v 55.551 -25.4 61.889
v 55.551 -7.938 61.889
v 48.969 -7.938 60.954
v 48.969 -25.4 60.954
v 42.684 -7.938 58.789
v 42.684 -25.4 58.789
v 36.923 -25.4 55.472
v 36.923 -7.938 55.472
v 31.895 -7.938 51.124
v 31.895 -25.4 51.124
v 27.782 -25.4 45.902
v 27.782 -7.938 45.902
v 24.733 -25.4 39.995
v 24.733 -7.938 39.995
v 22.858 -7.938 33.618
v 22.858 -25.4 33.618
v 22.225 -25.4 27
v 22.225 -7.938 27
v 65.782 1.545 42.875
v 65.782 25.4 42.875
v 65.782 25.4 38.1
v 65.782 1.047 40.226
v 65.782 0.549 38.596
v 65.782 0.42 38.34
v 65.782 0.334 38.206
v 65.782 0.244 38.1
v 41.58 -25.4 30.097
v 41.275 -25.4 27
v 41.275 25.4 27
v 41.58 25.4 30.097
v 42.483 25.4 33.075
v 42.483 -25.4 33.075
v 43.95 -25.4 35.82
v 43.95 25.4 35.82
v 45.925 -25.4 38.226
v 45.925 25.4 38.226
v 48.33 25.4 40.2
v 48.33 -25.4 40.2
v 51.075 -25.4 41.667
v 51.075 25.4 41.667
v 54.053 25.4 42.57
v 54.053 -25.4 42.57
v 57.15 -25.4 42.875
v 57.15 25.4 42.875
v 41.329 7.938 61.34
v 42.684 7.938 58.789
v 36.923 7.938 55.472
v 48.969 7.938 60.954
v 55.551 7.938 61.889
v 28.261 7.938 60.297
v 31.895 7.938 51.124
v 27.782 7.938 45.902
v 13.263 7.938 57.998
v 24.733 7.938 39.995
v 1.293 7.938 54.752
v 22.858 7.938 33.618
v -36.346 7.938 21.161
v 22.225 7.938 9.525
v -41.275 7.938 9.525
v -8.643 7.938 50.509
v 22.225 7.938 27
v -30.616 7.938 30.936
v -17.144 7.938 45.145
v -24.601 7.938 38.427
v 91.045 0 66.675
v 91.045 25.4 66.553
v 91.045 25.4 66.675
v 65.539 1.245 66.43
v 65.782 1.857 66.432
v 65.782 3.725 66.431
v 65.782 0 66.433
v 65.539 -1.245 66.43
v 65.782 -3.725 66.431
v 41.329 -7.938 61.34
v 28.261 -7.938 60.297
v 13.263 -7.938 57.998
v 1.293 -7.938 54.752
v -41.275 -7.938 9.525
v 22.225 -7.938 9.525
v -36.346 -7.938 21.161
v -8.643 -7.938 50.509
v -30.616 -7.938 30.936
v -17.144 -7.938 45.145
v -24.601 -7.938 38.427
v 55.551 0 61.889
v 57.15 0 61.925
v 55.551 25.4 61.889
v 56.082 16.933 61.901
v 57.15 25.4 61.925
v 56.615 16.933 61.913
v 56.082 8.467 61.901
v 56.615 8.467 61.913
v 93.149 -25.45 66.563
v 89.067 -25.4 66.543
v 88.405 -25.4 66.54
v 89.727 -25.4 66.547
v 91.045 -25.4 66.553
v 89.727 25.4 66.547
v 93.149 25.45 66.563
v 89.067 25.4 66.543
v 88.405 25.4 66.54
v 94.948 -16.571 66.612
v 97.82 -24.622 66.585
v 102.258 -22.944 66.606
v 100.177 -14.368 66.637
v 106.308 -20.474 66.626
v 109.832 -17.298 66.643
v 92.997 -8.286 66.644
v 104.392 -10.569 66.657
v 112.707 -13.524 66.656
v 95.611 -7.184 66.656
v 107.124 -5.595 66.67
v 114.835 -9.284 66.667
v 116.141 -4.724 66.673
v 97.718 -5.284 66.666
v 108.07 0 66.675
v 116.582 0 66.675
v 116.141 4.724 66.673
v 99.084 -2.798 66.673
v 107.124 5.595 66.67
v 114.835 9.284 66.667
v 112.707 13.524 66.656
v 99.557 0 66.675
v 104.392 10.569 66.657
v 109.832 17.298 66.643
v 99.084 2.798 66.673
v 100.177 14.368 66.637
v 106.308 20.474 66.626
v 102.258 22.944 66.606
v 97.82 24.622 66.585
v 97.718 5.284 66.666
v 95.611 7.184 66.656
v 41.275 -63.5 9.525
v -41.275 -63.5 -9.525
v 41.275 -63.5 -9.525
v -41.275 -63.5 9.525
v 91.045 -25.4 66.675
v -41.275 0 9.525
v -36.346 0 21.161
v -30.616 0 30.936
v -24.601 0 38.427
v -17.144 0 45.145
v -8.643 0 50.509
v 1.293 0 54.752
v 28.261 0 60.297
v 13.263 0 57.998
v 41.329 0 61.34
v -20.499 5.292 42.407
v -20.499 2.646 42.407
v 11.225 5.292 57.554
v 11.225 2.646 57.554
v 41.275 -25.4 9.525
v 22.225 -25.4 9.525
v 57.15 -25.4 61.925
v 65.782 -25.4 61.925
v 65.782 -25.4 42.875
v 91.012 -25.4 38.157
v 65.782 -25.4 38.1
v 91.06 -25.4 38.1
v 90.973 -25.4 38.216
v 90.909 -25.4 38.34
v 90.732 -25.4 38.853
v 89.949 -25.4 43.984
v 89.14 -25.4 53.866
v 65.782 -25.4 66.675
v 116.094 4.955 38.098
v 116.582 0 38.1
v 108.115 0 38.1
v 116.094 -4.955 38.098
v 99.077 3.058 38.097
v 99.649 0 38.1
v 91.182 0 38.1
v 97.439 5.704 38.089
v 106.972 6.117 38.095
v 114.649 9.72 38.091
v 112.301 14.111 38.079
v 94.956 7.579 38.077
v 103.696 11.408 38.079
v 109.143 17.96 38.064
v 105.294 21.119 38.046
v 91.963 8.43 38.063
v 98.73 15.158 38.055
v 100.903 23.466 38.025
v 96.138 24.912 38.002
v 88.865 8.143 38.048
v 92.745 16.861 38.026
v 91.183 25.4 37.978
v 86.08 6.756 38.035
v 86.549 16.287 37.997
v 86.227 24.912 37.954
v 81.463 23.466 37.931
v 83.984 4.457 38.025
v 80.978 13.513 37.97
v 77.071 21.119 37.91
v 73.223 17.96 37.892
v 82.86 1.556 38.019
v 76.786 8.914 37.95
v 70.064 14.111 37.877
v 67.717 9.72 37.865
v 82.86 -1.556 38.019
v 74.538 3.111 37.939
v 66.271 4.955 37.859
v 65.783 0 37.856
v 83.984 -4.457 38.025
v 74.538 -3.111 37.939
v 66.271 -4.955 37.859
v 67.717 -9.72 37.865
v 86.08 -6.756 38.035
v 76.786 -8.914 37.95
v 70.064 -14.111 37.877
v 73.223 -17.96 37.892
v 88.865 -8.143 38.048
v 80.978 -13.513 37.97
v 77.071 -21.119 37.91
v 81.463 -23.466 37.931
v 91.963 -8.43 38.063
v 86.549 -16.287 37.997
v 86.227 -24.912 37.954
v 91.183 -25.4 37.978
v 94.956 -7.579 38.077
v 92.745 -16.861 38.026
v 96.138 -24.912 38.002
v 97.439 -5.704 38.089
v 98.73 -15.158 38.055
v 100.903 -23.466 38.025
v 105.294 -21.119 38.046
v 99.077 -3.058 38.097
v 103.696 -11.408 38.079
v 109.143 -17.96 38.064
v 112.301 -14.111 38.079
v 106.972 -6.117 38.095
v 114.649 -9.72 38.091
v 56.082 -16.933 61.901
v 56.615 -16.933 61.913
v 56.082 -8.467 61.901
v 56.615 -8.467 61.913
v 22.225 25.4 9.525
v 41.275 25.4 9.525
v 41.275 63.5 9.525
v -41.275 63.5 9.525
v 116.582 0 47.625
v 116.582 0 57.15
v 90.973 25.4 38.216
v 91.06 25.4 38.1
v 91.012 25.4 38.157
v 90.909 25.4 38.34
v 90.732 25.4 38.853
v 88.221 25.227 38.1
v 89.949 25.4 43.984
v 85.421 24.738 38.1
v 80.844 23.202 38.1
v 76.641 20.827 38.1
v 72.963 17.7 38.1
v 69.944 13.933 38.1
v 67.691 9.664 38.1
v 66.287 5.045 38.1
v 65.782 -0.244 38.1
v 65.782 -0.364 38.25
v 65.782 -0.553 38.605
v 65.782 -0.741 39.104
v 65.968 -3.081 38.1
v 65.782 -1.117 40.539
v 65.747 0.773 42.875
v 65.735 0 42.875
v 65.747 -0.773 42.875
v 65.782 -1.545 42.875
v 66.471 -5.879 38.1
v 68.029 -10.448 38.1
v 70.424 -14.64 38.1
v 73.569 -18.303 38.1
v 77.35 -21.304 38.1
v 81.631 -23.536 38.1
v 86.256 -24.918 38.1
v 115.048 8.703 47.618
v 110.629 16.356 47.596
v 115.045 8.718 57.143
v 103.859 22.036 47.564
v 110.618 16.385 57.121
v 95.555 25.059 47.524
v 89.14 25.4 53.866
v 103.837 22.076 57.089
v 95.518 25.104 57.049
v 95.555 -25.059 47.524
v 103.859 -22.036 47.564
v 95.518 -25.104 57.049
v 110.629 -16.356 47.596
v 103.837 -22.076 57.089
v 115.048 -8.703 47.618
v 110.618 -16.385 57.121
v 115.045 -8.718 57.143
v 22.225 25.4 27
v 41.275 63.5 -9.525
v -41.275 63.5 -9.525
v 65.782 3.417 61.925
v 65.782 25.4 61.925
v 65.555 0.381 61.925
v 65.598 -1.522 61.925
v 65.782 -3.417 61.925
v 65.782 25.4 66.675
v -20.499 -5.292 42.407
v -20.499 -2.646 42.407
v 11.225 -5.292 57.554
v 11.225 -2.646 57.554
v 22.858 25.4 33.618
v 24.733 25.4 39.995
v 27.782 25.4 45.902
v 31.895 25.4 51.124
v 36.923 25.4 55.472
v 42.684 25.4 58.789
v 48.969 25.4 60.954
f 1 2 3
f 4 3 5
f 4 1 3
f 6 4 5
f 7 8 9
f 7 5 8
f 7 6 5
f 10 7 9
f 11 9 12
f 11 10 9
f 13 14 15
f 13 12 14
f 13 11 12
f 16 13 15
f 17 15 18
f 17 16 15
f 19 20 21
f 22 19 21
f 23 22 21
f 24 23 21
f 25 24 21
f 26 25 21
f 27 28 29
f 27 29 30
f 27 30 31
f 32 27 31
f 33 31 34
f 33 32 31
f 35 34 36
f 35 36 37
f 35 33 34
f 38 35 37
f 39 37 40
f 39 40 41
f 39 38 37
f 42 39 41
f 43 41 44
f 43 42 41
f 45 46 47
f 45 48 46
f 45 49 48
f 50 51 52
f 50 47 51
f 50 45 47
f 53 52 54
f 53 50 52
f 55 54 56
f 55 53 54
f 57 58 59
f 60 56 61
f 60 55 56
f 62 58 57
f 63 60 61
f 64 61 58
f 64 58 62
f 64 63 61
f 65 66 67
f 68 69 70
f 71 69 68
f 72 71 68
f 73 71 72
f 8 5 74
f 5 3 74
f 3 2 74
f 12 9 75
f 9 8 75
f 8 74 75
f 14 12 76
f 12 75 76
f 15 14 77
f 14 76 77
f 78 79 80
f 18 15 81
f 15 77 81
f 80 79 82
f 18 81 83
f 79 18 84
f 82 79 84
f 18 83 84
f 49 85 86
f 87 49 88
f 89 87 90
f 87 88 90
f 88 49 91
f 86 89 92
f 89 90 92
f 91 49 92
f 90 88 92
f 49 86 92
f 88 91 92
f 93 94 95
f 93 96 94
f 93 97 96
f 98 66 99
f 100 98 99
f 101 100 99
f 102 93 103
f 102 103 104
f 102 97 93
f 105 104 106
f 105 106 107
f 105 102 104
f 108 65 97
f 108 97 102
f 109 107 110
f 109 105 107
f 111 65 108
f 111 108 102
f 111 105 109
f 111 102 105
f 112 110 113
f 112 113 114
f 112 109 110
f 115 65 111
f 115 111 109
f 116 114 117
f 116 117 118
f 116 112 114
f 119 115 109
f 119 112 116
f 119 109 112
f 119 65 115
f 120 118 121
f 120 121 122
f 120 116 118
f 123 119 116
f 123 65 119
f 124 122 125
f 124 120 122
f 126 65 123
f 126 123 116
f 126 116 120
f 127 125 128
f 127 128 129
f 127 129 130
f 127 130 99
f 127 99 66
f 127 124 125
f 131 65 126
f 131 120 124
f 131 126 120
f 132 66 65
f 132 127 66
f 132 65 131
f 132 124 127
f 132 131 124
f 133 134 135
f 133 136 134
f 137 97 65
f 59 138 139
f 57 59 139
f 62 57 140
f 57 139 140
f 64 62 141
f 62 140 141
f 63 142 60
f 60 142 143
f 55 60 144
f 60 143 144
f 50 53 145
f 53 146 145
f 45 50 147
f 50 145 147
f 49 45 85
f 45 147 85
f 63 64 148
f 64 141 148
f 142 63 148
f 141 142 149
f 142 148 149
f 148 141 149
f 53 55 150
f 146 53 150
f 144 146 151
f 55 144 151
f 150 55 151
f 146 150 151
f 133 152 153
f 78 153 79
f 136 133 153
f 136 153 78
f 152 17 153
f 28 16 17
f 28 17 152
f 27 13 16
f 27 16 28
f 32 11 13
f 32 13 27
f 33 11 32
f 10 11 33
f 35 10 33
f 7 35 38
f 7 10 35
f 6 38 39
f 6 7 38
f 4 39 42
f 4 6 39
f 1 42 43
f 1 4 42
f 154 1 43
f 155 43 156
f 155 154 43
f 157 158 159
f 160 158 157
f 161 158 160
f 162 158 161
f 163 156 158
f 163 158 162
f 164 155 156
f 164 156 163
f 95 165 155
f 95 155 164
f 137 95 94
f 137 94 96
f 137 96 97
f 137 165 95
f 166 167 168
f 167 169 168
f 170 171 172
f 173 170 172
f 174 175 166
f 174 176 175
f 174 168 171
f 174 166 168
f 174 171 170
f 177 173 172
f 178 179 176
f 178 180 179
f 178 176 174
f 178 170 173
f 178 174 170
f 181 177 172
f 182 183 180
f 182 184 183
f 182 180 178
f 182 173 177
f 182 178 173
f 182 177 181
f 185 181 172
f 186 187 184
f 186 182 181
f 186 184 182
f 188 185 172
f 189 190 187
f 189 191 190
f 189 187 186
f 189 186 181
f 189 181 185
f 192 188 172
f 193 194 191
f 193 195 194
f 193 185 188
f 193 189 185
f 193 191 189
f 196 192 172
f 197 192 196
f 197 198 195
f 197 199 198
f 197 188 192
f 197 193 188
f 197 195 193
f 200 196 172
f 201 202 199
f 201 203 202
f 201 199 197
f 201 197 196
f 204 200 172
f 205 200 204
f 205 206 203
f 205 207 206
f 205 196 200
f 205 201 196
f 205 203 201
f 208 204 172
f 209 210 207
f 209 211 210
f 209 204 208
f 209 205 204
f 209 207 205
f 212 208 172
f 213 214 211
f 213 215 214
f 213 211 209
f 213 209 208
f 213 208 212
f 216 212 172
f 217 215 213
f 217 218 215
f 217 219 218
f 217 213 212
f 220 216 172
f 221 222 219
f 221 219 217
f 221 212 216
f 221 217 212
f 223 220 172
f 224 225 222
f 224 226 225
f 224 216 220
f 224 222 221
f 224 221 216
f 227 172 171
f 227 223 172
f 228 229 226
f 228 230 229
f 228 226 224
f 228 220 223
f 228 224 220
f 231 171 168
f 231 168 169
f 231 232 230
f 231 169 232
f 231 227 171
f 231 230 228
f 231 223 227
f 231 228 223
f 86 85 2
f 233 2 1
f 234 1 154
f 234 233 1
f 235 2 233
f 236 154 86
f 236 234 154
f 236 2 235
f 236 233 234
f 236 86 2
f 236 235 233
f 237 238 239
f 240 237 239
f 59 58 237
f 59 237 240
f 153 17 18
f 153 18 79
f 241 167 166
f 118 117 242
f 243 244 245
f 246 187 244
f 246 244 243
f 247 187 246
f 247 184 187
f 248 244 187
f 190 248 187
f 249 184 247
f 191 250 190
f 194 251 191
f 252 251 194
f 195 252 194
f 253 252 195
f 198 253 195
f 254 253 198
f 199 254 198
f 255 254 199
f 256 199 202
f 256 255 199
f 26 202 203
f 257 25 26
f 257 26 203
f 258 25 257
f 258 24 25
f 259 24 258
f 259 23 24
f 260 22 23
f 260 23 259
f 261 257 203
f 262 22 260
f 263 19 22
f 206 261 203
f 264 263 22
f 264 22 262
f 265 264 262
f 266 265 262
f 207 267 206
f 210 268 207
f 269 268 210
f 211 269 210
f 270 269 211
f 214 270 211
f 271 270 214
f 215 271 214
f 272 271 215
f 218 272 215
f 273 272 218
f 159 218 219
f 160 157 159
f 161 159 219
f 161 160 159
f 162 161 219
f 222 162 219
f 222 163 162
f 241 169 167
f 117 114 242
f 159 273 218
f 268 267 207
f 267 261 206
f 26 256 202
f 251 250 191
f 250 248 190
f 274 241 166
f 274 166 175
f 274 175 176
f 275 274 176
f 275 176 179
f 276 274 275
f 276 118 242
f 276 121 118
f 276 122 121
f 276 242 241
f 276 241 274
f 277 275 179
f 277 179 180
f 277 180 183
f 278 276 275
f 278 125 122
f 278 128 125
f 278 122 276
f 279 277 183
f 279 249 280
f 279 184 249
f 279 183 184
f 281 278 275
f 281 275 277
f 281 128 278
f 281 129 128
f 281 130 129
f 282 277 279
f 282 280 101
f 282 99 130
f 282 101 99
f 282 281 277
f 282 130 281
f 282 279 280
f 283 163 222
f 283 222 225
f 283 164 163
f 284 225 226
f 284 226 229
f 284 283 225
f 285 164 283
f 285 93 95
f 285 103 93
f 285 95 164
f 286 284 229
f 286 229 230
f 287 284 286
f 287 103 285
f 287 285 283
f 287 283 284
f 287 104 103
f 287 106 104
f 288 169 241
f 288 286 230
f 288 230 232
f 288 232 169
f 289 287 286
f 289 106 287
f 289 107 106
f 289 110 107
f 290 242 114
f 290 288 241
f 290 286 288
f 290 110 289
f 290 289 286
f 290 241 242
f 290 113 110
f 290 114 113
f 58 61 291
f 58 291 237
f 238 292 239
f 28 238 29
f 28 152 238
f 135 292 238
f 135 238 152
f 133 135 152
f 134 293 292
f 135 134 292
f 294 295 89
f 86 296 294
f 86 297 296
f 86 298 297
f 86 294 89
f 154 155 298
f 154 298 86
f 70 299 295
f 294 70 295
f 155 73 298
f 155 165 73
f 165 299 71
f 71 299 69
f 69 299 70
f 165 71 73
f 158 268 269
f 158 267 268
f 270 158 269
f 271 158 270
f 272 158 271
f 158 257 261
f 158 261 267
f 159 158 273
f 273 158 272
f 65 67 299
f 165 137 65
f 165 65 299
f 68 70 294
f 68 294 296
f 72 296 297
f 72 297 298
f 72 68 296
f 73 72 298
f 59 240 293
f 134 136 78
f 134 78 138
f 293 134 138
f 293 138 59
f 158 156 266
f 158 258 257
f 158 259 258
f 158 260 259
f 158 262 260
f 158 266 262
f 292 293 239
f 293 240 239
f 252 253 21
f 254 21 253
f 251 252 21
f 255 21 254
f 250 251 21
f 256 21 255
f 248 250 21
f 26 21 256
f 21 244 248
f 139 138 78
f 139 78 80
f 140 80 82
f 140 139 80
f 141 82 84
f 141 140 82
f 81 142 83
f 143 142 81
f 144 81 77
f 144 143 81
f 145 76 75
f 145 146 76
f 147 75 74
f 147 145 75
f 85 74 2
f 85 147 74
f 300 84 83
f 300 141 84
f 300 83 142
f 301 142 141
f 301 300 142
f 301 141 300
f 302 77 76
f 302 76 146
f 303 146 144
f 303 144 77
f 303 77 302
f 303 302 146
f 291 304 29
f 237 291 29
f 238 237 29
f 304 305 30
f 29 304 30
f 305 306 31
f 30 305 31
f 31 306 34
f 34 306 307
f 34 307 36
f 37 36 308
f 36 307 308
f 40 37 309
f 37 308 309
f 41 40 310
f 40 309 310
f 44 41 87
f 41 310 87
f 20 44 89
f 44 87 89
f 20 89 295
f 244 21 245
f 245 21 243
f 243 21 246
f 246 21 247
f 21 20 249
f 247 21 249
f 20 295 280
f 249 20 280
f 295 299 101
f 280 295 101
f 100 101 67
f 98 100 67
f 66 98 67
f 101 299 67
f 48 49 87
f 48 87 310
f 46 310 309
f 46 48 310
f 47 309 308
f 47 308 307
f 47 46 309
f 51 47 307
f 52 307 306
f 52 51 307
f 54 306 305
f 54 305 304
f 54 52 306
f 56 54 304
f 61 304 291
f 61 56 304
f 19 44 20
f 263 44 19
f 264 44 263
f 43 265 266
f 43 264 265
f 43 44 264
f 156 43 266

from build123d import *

# Parameters (mm, degrees)
F1_DEPTH = 63.5
F2_DEPTH = 25.4
F3_DEPTH = 7.9375
F4_DEPTH = 25.4


with BuildPart() as f1:
    # F0 (on Front) → F1 (new body, symmetric)
    with BuildSketch(Plane.XZ):
        Polygon((-41.275, -9.525), (41.275, -9.525), (41.275, 9.525), (22.225, 9.525), (-41.275, 9.525), align=None)
    extrude(amount=F1_DEPTH, both=True)

    # F0 (on Front) → F2 (join, symmetric)
    with BuildSketch(Plane.XZ):
        with BuildLine():
            Line((22.225, 9.525), (41.275, 9.525))
            Line((41.275, 9.525), (41.275, 27.0002))
            ThreePointArc((41.275, 27.0002), (45.9246798487, 38.2255201513), (57.15, 42.8752))
            Line((57.15, 42.8752), (65.7820404529, 42.8752))
            Line((65.7820404529, 42.8752), (65.7820404529, 61.9252))
            Line((65.7820404529, 61.9252), (57.15, 61.9252))
            add(Edge.make_bspline(
                [(55.550874855, 61.8885708959), (56.0816141812, 61.9013962884), (56.6146531302, 61.9135944066), (57.15, 61.9252)],
                knots=[110.3600423444, 110.3600423444, 110.3600423444, 110.3600423444, 111.5045361635, 111.5045361635, 111.5045361635, 111.5045361635], degree=3))
            ThreePointArc((55.550874855, 61.8885708959), (31.8952472721, 51.1239038959), (22.225, 27.0002))
            Line((22.225, 27.0002), (22.225, 9.525))
        make_face()
    extrude(amount=F2_DEPTH, both=True)

    # F0 (on Front) → F3 (join, symmetric)
    with BuildSketch(Plane.XZ):
        with BuildLine():
            add(Edge.make_bspline(
                [(-41.275, 9.525), (-25.4220175823, 53.5826509426), (4.3733031342, 60.6518574843), (55.550874855, 61.8885708959)],
                knots=[0, 0, 0, 0, 110.3600423444, 110.3600423444, 110.3600423444, 110.3600423444], degree=3))
            Line((-41.275, 9.525), (22.225, 9.525))
            Line((22.225, 9.525), (22.225, 27.0002))
            ThreePointArc((22.225, 27.0002), (31.8952472721, 51.1239038959), (55.550874855, 61.8885708959))
        make_face()
    extrude(amount=F3_DEPTH, both=True)

    # F0 (on Front) → F4 (join, symmetric)
    with BuildSketch(Plane.XZ):
        Polygon((65.7820404529, 61.9252), (65.7820404529, 42.8752), (65.7820404529, 38.1), (91.1820404529, 38.1), (91.0449102521, 66.675), (65.7820404529, 66.675), align=None)
    extrude(amount=F4_DEPTH, both=True)

    # F0 (on Front) → F5 (revolve)
    with BuildSketch(Plane.XZ):
        Polygon((91.0449102521, 66.675), (91.1820404529, 38.1), (116.5820404529, 38.1), (116.5820404529, 66.675), align=None)
    revolve(axis=Axis((91.1134753525, 0, 52.3875), (-0.0047989019, 0, 0.9999884852)))


solid = f1.part
